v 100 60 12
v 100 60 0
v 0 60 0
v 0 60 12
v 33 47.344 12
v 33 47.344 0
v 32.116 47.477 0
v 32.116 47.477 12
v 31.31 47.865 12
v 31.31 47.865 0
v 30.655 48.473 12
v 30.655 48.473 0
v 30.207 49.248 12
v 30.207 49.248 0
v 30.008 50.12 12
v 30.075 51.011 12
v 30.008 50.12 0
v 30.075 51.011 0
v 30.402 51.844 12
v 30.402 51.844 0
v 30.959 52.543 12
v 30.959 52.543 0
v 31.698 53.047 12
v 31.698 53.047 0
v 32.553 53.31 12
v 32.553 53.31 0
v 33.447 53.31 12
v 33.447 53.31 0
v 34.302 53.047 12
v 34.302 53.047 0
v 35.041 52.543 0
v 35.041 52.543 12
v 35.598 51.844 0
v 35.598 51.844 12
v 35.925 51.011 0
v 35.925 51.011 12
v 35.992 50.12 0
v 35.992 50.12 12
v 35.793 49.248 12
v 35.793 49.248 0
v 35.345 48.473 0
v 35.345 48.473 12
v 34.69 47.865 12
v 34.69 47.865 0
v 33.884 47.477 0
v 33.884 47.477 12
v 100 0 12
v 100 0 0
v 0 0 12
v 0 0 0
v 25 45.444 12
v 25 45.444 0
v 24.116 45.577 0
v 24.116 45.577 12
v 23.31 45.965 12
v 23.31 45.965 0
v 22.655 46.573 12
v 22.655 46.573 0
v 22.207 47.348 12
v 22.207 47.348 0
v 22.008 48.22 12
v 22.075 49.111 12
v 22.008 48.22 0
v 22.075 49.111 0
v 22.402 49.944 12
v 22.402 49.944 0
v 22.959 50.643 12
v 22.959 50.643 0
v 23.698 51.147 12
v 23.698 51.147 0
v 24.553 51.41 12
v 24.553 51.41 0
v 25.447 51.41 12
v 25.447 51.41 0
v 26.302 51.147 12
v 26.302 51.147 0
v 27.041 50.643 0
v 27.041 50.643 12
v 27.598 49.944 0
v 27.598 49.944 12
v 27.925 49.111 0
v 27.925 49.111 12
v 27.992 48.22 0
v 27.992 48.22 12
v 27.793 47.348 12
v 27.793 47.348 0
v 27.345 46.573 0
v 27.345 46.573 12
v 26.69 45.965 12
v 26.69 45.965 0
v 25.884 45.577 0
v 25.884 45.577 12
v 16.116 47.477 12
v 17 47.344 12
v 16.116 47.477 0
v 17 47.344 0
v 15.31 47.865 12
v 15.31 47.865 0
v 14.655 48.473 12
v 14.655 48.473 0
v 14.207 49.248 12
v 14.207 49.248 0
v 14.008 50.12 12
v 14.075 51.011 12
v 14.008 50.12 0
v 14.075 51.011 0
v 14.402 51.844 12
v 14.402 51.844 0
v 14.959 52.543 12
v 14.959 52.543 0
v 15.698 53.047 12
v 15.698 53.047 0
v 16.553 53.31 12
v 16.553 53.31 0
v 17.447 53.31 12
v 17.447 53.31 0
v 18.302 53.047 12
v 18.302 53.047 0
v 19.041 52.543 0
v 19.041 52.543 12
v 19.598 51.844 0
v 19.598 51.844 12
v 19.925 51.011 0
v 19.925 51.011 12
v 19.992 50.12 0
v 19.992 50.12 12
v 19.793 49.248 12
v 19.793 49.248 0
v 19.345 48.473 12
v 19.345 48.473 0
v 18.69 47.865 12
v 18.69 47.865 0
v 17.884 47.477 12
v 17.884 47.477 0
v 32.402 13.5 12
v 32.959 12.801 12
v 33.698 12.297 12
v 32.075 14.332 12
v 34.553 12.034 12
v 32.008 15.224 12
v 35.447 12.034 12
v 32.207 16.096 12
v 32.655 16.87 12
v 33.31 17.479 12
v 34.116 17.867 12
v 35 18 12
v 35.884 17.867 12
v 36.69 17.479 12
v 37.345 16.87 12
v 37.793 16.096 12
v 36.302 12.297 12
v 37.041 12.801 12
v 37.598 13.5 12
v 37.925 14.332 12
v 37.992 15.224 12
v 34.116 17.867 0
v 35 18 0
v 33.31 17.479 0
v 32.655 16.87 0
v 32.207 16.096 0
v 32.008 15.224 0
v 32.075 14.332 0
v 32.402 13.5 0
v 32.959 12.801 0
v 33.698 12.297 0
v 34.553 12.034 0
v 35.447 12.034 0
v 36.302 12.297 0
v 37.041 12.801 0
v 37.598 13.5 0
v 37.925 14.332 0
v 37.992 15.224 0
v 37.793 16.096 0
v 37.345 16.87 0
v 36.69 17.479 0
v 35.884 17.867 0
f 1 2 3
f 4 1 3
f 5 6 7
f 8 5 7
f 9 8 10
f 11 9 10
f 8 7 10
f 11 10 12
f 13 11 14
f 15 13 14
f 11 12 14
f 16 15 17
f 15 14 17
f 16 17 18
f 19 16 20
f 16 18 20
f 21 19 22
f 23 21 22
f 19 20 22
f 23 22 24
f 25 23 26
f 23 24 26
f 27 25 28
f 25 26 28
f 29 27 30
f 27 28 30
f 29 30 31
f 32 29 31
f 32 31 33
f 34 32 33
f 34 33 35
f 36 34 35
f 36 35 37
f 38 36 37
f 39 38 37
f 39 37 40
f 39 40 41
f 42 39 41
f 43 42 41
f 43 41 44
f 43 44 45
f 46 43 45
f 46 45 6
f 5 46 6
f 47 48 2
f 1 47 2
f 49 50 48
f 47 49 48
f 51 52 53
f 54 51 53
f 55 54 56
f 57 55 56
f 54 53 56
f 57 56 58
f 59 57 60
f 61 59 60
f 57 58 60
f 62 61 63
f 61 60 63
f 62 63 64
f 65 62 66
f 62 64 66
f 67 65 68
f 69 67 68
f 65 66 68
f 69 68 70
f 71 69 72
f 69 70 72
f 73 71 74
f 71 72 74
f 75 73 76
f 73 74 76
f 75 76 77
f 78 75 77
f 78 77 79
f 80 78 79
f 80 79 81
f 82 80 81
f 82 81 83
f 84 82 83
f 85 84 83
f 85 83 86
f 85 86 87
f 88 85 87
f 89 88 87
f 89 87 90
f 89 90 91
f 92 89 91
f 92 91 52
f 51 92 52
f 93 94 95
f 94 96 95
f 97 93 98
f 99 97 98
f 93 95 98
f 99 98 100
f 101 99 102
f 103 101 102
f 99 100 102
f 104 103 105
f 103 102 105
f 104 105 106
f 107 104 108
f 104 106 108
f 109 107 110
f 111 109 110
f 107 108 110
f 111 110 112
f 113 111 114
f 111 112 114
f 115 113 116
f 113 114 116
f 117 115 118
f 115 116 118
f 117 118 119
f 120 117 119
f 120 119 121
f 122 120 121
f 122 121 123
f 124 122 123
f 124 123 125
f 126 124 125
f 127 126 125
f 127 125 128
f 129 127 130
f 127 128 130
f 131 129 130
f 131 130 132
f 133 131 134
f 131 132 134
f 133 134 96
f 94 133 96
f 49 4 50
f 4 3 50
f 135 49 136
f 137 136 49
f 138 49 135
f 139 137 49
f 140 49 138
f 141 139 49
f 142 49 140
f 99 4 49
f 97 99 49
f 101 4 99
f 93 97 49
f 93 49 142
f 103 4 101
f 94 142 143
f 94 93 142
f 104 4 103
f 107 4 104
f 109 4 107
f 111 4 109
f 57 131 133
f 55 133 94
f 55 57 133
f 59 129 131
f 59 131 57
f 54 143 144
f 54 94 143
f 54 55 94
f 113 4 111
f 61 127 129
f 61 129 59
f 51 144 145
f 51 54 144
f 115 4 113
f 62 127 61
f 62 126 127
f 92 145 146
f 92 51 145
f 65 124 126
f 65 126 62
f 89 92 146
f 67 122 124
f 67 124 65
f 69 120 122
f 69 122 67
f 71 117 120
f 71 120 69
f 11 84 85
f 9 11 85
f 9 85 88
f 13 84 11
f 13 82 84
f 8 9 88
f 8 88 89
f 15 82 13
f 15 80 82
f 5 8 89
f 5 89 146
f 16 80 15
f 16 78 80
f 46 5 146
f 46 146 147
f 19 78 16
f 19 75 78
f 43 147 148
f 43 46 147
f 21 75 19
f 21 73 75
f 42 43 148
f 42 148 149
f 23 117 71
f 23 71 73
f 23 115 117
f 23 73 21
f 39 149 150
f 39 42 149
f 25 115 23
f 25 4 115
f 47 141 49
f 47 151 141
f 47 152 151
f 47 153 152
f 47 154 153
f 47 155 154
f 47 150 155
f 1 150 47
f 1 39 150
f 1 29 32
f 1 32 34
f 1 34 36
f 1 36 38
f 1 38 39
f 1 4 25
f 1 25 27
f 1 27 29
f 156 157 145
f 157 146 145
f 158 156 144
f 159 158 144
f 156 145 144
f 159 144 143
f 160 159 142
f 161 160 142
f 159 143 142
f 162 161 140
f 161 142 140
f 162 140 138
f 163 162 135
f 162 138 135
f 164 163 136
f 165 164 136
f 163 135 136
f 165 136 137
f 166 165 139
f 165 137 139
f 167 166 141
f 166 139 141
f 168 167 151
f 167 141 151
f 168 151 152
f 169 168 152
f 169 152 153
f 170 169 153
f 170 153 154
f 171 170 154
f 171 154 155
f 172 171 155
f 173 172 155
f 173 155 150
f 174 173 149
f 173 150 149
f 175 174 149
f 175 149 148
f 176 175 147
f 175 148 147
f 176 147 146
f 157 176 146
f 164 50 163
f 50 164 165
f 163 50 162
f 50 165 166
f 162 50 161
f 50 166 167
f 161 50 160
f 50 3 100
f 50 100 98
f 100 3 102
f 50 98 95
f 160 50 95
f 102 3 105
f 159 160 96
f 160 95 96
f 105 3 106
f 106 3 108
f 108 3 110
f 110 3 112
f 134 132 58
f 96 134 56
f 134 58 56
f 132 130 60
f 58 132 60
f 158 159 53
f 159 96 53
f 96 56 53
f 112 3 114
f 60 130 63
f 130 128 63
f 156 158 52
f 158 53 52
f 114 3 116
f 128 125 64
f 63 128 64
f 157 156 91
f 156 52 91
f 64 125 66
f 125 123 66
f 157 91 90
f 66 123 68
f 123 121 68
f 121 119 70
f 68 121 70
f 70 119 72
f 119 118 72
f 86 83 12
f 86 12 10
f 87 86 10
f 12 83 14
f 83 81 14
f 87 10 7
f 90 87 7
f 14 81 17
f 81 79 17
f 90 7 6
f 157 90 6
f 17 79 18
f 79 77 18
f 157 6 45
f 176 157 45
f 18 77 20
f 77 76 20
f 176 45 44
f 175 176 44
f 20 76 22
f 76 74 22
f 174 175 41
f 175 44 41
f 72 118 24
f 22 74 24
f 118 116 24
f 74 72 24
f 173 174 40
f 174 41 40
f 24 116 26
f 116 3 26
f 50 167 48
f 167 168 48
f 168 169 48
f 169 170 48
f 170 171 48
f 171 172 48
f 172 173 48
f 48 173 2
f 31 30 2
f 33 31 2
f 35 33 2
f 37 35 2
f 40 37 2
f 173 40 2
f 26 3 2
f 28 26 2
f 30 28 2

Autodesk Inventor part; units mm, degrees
ref_plane "YZ Plane" through (0, 0, 0) normal (1, 0, 0) x (0, 1, 0)
ref_plane "XZ Plane" through (0, 0, 0) normal (0, 1, 0) x (-1, 0, 0)
ref_plane "XY Plane" through (0, 0, 0) normal (0, 0, 1) x (1, 0, 0)
sketch "Skizze1" plane through (0, 0, 0) normal (0, 0, 1) x (1, 0, 0)
  line L0 (0, 0) -> (100, 0)
  line L1 (100, 0) -> (100, 60)
  line L2 (100, 60) -> (0, 60)
  line L3 (0, 60) -> (0, 0)
  dimension "d0" = 100
  dimension "d1" = 60
extrude "Extrusion1" add sketch "Skizze1" along normal blind 12
sketch "Skizze2" plane through (0, 0, 12) normal (0, 0, 1) x (1, 0, 0)
  circle A0 centre (33, 50.3439) radius 3
  circle A1 centre (17, 50.3439) radius 3
  point P0 (0, 0)
  point P1 (25, 45.3439)
hole "Bohrung1" at (17, 50.3439, 12) at (33, 50.3439, 12) direction (0, 0, -1) diameter 6 end through all
sketch "Skizze4" plane through (0, 0, 12) normal (0, 0, 1) x (1, 0, 0)
  circle A0 centre (25, 48.4439) radius 3.1
  point P0 (0, 0)
  point P1 (25, 45.3439)
hole "Bohrung3" at (25, 48.4439, 12) direction (0, 0, -1) diameter 6 end through all
sketch "Skizze6" plane through (0, 0, 0) normal (0, 0, -1) x (-1, 0, 0)
  circle A0 centre (-35, 15) radius 2.5
  point P0 (0, 0)
hole "Bohrung5" at (35, 15, 0) direction (0, 0, 1) diameter 6 end through all
properties part number "Seitenwand"
